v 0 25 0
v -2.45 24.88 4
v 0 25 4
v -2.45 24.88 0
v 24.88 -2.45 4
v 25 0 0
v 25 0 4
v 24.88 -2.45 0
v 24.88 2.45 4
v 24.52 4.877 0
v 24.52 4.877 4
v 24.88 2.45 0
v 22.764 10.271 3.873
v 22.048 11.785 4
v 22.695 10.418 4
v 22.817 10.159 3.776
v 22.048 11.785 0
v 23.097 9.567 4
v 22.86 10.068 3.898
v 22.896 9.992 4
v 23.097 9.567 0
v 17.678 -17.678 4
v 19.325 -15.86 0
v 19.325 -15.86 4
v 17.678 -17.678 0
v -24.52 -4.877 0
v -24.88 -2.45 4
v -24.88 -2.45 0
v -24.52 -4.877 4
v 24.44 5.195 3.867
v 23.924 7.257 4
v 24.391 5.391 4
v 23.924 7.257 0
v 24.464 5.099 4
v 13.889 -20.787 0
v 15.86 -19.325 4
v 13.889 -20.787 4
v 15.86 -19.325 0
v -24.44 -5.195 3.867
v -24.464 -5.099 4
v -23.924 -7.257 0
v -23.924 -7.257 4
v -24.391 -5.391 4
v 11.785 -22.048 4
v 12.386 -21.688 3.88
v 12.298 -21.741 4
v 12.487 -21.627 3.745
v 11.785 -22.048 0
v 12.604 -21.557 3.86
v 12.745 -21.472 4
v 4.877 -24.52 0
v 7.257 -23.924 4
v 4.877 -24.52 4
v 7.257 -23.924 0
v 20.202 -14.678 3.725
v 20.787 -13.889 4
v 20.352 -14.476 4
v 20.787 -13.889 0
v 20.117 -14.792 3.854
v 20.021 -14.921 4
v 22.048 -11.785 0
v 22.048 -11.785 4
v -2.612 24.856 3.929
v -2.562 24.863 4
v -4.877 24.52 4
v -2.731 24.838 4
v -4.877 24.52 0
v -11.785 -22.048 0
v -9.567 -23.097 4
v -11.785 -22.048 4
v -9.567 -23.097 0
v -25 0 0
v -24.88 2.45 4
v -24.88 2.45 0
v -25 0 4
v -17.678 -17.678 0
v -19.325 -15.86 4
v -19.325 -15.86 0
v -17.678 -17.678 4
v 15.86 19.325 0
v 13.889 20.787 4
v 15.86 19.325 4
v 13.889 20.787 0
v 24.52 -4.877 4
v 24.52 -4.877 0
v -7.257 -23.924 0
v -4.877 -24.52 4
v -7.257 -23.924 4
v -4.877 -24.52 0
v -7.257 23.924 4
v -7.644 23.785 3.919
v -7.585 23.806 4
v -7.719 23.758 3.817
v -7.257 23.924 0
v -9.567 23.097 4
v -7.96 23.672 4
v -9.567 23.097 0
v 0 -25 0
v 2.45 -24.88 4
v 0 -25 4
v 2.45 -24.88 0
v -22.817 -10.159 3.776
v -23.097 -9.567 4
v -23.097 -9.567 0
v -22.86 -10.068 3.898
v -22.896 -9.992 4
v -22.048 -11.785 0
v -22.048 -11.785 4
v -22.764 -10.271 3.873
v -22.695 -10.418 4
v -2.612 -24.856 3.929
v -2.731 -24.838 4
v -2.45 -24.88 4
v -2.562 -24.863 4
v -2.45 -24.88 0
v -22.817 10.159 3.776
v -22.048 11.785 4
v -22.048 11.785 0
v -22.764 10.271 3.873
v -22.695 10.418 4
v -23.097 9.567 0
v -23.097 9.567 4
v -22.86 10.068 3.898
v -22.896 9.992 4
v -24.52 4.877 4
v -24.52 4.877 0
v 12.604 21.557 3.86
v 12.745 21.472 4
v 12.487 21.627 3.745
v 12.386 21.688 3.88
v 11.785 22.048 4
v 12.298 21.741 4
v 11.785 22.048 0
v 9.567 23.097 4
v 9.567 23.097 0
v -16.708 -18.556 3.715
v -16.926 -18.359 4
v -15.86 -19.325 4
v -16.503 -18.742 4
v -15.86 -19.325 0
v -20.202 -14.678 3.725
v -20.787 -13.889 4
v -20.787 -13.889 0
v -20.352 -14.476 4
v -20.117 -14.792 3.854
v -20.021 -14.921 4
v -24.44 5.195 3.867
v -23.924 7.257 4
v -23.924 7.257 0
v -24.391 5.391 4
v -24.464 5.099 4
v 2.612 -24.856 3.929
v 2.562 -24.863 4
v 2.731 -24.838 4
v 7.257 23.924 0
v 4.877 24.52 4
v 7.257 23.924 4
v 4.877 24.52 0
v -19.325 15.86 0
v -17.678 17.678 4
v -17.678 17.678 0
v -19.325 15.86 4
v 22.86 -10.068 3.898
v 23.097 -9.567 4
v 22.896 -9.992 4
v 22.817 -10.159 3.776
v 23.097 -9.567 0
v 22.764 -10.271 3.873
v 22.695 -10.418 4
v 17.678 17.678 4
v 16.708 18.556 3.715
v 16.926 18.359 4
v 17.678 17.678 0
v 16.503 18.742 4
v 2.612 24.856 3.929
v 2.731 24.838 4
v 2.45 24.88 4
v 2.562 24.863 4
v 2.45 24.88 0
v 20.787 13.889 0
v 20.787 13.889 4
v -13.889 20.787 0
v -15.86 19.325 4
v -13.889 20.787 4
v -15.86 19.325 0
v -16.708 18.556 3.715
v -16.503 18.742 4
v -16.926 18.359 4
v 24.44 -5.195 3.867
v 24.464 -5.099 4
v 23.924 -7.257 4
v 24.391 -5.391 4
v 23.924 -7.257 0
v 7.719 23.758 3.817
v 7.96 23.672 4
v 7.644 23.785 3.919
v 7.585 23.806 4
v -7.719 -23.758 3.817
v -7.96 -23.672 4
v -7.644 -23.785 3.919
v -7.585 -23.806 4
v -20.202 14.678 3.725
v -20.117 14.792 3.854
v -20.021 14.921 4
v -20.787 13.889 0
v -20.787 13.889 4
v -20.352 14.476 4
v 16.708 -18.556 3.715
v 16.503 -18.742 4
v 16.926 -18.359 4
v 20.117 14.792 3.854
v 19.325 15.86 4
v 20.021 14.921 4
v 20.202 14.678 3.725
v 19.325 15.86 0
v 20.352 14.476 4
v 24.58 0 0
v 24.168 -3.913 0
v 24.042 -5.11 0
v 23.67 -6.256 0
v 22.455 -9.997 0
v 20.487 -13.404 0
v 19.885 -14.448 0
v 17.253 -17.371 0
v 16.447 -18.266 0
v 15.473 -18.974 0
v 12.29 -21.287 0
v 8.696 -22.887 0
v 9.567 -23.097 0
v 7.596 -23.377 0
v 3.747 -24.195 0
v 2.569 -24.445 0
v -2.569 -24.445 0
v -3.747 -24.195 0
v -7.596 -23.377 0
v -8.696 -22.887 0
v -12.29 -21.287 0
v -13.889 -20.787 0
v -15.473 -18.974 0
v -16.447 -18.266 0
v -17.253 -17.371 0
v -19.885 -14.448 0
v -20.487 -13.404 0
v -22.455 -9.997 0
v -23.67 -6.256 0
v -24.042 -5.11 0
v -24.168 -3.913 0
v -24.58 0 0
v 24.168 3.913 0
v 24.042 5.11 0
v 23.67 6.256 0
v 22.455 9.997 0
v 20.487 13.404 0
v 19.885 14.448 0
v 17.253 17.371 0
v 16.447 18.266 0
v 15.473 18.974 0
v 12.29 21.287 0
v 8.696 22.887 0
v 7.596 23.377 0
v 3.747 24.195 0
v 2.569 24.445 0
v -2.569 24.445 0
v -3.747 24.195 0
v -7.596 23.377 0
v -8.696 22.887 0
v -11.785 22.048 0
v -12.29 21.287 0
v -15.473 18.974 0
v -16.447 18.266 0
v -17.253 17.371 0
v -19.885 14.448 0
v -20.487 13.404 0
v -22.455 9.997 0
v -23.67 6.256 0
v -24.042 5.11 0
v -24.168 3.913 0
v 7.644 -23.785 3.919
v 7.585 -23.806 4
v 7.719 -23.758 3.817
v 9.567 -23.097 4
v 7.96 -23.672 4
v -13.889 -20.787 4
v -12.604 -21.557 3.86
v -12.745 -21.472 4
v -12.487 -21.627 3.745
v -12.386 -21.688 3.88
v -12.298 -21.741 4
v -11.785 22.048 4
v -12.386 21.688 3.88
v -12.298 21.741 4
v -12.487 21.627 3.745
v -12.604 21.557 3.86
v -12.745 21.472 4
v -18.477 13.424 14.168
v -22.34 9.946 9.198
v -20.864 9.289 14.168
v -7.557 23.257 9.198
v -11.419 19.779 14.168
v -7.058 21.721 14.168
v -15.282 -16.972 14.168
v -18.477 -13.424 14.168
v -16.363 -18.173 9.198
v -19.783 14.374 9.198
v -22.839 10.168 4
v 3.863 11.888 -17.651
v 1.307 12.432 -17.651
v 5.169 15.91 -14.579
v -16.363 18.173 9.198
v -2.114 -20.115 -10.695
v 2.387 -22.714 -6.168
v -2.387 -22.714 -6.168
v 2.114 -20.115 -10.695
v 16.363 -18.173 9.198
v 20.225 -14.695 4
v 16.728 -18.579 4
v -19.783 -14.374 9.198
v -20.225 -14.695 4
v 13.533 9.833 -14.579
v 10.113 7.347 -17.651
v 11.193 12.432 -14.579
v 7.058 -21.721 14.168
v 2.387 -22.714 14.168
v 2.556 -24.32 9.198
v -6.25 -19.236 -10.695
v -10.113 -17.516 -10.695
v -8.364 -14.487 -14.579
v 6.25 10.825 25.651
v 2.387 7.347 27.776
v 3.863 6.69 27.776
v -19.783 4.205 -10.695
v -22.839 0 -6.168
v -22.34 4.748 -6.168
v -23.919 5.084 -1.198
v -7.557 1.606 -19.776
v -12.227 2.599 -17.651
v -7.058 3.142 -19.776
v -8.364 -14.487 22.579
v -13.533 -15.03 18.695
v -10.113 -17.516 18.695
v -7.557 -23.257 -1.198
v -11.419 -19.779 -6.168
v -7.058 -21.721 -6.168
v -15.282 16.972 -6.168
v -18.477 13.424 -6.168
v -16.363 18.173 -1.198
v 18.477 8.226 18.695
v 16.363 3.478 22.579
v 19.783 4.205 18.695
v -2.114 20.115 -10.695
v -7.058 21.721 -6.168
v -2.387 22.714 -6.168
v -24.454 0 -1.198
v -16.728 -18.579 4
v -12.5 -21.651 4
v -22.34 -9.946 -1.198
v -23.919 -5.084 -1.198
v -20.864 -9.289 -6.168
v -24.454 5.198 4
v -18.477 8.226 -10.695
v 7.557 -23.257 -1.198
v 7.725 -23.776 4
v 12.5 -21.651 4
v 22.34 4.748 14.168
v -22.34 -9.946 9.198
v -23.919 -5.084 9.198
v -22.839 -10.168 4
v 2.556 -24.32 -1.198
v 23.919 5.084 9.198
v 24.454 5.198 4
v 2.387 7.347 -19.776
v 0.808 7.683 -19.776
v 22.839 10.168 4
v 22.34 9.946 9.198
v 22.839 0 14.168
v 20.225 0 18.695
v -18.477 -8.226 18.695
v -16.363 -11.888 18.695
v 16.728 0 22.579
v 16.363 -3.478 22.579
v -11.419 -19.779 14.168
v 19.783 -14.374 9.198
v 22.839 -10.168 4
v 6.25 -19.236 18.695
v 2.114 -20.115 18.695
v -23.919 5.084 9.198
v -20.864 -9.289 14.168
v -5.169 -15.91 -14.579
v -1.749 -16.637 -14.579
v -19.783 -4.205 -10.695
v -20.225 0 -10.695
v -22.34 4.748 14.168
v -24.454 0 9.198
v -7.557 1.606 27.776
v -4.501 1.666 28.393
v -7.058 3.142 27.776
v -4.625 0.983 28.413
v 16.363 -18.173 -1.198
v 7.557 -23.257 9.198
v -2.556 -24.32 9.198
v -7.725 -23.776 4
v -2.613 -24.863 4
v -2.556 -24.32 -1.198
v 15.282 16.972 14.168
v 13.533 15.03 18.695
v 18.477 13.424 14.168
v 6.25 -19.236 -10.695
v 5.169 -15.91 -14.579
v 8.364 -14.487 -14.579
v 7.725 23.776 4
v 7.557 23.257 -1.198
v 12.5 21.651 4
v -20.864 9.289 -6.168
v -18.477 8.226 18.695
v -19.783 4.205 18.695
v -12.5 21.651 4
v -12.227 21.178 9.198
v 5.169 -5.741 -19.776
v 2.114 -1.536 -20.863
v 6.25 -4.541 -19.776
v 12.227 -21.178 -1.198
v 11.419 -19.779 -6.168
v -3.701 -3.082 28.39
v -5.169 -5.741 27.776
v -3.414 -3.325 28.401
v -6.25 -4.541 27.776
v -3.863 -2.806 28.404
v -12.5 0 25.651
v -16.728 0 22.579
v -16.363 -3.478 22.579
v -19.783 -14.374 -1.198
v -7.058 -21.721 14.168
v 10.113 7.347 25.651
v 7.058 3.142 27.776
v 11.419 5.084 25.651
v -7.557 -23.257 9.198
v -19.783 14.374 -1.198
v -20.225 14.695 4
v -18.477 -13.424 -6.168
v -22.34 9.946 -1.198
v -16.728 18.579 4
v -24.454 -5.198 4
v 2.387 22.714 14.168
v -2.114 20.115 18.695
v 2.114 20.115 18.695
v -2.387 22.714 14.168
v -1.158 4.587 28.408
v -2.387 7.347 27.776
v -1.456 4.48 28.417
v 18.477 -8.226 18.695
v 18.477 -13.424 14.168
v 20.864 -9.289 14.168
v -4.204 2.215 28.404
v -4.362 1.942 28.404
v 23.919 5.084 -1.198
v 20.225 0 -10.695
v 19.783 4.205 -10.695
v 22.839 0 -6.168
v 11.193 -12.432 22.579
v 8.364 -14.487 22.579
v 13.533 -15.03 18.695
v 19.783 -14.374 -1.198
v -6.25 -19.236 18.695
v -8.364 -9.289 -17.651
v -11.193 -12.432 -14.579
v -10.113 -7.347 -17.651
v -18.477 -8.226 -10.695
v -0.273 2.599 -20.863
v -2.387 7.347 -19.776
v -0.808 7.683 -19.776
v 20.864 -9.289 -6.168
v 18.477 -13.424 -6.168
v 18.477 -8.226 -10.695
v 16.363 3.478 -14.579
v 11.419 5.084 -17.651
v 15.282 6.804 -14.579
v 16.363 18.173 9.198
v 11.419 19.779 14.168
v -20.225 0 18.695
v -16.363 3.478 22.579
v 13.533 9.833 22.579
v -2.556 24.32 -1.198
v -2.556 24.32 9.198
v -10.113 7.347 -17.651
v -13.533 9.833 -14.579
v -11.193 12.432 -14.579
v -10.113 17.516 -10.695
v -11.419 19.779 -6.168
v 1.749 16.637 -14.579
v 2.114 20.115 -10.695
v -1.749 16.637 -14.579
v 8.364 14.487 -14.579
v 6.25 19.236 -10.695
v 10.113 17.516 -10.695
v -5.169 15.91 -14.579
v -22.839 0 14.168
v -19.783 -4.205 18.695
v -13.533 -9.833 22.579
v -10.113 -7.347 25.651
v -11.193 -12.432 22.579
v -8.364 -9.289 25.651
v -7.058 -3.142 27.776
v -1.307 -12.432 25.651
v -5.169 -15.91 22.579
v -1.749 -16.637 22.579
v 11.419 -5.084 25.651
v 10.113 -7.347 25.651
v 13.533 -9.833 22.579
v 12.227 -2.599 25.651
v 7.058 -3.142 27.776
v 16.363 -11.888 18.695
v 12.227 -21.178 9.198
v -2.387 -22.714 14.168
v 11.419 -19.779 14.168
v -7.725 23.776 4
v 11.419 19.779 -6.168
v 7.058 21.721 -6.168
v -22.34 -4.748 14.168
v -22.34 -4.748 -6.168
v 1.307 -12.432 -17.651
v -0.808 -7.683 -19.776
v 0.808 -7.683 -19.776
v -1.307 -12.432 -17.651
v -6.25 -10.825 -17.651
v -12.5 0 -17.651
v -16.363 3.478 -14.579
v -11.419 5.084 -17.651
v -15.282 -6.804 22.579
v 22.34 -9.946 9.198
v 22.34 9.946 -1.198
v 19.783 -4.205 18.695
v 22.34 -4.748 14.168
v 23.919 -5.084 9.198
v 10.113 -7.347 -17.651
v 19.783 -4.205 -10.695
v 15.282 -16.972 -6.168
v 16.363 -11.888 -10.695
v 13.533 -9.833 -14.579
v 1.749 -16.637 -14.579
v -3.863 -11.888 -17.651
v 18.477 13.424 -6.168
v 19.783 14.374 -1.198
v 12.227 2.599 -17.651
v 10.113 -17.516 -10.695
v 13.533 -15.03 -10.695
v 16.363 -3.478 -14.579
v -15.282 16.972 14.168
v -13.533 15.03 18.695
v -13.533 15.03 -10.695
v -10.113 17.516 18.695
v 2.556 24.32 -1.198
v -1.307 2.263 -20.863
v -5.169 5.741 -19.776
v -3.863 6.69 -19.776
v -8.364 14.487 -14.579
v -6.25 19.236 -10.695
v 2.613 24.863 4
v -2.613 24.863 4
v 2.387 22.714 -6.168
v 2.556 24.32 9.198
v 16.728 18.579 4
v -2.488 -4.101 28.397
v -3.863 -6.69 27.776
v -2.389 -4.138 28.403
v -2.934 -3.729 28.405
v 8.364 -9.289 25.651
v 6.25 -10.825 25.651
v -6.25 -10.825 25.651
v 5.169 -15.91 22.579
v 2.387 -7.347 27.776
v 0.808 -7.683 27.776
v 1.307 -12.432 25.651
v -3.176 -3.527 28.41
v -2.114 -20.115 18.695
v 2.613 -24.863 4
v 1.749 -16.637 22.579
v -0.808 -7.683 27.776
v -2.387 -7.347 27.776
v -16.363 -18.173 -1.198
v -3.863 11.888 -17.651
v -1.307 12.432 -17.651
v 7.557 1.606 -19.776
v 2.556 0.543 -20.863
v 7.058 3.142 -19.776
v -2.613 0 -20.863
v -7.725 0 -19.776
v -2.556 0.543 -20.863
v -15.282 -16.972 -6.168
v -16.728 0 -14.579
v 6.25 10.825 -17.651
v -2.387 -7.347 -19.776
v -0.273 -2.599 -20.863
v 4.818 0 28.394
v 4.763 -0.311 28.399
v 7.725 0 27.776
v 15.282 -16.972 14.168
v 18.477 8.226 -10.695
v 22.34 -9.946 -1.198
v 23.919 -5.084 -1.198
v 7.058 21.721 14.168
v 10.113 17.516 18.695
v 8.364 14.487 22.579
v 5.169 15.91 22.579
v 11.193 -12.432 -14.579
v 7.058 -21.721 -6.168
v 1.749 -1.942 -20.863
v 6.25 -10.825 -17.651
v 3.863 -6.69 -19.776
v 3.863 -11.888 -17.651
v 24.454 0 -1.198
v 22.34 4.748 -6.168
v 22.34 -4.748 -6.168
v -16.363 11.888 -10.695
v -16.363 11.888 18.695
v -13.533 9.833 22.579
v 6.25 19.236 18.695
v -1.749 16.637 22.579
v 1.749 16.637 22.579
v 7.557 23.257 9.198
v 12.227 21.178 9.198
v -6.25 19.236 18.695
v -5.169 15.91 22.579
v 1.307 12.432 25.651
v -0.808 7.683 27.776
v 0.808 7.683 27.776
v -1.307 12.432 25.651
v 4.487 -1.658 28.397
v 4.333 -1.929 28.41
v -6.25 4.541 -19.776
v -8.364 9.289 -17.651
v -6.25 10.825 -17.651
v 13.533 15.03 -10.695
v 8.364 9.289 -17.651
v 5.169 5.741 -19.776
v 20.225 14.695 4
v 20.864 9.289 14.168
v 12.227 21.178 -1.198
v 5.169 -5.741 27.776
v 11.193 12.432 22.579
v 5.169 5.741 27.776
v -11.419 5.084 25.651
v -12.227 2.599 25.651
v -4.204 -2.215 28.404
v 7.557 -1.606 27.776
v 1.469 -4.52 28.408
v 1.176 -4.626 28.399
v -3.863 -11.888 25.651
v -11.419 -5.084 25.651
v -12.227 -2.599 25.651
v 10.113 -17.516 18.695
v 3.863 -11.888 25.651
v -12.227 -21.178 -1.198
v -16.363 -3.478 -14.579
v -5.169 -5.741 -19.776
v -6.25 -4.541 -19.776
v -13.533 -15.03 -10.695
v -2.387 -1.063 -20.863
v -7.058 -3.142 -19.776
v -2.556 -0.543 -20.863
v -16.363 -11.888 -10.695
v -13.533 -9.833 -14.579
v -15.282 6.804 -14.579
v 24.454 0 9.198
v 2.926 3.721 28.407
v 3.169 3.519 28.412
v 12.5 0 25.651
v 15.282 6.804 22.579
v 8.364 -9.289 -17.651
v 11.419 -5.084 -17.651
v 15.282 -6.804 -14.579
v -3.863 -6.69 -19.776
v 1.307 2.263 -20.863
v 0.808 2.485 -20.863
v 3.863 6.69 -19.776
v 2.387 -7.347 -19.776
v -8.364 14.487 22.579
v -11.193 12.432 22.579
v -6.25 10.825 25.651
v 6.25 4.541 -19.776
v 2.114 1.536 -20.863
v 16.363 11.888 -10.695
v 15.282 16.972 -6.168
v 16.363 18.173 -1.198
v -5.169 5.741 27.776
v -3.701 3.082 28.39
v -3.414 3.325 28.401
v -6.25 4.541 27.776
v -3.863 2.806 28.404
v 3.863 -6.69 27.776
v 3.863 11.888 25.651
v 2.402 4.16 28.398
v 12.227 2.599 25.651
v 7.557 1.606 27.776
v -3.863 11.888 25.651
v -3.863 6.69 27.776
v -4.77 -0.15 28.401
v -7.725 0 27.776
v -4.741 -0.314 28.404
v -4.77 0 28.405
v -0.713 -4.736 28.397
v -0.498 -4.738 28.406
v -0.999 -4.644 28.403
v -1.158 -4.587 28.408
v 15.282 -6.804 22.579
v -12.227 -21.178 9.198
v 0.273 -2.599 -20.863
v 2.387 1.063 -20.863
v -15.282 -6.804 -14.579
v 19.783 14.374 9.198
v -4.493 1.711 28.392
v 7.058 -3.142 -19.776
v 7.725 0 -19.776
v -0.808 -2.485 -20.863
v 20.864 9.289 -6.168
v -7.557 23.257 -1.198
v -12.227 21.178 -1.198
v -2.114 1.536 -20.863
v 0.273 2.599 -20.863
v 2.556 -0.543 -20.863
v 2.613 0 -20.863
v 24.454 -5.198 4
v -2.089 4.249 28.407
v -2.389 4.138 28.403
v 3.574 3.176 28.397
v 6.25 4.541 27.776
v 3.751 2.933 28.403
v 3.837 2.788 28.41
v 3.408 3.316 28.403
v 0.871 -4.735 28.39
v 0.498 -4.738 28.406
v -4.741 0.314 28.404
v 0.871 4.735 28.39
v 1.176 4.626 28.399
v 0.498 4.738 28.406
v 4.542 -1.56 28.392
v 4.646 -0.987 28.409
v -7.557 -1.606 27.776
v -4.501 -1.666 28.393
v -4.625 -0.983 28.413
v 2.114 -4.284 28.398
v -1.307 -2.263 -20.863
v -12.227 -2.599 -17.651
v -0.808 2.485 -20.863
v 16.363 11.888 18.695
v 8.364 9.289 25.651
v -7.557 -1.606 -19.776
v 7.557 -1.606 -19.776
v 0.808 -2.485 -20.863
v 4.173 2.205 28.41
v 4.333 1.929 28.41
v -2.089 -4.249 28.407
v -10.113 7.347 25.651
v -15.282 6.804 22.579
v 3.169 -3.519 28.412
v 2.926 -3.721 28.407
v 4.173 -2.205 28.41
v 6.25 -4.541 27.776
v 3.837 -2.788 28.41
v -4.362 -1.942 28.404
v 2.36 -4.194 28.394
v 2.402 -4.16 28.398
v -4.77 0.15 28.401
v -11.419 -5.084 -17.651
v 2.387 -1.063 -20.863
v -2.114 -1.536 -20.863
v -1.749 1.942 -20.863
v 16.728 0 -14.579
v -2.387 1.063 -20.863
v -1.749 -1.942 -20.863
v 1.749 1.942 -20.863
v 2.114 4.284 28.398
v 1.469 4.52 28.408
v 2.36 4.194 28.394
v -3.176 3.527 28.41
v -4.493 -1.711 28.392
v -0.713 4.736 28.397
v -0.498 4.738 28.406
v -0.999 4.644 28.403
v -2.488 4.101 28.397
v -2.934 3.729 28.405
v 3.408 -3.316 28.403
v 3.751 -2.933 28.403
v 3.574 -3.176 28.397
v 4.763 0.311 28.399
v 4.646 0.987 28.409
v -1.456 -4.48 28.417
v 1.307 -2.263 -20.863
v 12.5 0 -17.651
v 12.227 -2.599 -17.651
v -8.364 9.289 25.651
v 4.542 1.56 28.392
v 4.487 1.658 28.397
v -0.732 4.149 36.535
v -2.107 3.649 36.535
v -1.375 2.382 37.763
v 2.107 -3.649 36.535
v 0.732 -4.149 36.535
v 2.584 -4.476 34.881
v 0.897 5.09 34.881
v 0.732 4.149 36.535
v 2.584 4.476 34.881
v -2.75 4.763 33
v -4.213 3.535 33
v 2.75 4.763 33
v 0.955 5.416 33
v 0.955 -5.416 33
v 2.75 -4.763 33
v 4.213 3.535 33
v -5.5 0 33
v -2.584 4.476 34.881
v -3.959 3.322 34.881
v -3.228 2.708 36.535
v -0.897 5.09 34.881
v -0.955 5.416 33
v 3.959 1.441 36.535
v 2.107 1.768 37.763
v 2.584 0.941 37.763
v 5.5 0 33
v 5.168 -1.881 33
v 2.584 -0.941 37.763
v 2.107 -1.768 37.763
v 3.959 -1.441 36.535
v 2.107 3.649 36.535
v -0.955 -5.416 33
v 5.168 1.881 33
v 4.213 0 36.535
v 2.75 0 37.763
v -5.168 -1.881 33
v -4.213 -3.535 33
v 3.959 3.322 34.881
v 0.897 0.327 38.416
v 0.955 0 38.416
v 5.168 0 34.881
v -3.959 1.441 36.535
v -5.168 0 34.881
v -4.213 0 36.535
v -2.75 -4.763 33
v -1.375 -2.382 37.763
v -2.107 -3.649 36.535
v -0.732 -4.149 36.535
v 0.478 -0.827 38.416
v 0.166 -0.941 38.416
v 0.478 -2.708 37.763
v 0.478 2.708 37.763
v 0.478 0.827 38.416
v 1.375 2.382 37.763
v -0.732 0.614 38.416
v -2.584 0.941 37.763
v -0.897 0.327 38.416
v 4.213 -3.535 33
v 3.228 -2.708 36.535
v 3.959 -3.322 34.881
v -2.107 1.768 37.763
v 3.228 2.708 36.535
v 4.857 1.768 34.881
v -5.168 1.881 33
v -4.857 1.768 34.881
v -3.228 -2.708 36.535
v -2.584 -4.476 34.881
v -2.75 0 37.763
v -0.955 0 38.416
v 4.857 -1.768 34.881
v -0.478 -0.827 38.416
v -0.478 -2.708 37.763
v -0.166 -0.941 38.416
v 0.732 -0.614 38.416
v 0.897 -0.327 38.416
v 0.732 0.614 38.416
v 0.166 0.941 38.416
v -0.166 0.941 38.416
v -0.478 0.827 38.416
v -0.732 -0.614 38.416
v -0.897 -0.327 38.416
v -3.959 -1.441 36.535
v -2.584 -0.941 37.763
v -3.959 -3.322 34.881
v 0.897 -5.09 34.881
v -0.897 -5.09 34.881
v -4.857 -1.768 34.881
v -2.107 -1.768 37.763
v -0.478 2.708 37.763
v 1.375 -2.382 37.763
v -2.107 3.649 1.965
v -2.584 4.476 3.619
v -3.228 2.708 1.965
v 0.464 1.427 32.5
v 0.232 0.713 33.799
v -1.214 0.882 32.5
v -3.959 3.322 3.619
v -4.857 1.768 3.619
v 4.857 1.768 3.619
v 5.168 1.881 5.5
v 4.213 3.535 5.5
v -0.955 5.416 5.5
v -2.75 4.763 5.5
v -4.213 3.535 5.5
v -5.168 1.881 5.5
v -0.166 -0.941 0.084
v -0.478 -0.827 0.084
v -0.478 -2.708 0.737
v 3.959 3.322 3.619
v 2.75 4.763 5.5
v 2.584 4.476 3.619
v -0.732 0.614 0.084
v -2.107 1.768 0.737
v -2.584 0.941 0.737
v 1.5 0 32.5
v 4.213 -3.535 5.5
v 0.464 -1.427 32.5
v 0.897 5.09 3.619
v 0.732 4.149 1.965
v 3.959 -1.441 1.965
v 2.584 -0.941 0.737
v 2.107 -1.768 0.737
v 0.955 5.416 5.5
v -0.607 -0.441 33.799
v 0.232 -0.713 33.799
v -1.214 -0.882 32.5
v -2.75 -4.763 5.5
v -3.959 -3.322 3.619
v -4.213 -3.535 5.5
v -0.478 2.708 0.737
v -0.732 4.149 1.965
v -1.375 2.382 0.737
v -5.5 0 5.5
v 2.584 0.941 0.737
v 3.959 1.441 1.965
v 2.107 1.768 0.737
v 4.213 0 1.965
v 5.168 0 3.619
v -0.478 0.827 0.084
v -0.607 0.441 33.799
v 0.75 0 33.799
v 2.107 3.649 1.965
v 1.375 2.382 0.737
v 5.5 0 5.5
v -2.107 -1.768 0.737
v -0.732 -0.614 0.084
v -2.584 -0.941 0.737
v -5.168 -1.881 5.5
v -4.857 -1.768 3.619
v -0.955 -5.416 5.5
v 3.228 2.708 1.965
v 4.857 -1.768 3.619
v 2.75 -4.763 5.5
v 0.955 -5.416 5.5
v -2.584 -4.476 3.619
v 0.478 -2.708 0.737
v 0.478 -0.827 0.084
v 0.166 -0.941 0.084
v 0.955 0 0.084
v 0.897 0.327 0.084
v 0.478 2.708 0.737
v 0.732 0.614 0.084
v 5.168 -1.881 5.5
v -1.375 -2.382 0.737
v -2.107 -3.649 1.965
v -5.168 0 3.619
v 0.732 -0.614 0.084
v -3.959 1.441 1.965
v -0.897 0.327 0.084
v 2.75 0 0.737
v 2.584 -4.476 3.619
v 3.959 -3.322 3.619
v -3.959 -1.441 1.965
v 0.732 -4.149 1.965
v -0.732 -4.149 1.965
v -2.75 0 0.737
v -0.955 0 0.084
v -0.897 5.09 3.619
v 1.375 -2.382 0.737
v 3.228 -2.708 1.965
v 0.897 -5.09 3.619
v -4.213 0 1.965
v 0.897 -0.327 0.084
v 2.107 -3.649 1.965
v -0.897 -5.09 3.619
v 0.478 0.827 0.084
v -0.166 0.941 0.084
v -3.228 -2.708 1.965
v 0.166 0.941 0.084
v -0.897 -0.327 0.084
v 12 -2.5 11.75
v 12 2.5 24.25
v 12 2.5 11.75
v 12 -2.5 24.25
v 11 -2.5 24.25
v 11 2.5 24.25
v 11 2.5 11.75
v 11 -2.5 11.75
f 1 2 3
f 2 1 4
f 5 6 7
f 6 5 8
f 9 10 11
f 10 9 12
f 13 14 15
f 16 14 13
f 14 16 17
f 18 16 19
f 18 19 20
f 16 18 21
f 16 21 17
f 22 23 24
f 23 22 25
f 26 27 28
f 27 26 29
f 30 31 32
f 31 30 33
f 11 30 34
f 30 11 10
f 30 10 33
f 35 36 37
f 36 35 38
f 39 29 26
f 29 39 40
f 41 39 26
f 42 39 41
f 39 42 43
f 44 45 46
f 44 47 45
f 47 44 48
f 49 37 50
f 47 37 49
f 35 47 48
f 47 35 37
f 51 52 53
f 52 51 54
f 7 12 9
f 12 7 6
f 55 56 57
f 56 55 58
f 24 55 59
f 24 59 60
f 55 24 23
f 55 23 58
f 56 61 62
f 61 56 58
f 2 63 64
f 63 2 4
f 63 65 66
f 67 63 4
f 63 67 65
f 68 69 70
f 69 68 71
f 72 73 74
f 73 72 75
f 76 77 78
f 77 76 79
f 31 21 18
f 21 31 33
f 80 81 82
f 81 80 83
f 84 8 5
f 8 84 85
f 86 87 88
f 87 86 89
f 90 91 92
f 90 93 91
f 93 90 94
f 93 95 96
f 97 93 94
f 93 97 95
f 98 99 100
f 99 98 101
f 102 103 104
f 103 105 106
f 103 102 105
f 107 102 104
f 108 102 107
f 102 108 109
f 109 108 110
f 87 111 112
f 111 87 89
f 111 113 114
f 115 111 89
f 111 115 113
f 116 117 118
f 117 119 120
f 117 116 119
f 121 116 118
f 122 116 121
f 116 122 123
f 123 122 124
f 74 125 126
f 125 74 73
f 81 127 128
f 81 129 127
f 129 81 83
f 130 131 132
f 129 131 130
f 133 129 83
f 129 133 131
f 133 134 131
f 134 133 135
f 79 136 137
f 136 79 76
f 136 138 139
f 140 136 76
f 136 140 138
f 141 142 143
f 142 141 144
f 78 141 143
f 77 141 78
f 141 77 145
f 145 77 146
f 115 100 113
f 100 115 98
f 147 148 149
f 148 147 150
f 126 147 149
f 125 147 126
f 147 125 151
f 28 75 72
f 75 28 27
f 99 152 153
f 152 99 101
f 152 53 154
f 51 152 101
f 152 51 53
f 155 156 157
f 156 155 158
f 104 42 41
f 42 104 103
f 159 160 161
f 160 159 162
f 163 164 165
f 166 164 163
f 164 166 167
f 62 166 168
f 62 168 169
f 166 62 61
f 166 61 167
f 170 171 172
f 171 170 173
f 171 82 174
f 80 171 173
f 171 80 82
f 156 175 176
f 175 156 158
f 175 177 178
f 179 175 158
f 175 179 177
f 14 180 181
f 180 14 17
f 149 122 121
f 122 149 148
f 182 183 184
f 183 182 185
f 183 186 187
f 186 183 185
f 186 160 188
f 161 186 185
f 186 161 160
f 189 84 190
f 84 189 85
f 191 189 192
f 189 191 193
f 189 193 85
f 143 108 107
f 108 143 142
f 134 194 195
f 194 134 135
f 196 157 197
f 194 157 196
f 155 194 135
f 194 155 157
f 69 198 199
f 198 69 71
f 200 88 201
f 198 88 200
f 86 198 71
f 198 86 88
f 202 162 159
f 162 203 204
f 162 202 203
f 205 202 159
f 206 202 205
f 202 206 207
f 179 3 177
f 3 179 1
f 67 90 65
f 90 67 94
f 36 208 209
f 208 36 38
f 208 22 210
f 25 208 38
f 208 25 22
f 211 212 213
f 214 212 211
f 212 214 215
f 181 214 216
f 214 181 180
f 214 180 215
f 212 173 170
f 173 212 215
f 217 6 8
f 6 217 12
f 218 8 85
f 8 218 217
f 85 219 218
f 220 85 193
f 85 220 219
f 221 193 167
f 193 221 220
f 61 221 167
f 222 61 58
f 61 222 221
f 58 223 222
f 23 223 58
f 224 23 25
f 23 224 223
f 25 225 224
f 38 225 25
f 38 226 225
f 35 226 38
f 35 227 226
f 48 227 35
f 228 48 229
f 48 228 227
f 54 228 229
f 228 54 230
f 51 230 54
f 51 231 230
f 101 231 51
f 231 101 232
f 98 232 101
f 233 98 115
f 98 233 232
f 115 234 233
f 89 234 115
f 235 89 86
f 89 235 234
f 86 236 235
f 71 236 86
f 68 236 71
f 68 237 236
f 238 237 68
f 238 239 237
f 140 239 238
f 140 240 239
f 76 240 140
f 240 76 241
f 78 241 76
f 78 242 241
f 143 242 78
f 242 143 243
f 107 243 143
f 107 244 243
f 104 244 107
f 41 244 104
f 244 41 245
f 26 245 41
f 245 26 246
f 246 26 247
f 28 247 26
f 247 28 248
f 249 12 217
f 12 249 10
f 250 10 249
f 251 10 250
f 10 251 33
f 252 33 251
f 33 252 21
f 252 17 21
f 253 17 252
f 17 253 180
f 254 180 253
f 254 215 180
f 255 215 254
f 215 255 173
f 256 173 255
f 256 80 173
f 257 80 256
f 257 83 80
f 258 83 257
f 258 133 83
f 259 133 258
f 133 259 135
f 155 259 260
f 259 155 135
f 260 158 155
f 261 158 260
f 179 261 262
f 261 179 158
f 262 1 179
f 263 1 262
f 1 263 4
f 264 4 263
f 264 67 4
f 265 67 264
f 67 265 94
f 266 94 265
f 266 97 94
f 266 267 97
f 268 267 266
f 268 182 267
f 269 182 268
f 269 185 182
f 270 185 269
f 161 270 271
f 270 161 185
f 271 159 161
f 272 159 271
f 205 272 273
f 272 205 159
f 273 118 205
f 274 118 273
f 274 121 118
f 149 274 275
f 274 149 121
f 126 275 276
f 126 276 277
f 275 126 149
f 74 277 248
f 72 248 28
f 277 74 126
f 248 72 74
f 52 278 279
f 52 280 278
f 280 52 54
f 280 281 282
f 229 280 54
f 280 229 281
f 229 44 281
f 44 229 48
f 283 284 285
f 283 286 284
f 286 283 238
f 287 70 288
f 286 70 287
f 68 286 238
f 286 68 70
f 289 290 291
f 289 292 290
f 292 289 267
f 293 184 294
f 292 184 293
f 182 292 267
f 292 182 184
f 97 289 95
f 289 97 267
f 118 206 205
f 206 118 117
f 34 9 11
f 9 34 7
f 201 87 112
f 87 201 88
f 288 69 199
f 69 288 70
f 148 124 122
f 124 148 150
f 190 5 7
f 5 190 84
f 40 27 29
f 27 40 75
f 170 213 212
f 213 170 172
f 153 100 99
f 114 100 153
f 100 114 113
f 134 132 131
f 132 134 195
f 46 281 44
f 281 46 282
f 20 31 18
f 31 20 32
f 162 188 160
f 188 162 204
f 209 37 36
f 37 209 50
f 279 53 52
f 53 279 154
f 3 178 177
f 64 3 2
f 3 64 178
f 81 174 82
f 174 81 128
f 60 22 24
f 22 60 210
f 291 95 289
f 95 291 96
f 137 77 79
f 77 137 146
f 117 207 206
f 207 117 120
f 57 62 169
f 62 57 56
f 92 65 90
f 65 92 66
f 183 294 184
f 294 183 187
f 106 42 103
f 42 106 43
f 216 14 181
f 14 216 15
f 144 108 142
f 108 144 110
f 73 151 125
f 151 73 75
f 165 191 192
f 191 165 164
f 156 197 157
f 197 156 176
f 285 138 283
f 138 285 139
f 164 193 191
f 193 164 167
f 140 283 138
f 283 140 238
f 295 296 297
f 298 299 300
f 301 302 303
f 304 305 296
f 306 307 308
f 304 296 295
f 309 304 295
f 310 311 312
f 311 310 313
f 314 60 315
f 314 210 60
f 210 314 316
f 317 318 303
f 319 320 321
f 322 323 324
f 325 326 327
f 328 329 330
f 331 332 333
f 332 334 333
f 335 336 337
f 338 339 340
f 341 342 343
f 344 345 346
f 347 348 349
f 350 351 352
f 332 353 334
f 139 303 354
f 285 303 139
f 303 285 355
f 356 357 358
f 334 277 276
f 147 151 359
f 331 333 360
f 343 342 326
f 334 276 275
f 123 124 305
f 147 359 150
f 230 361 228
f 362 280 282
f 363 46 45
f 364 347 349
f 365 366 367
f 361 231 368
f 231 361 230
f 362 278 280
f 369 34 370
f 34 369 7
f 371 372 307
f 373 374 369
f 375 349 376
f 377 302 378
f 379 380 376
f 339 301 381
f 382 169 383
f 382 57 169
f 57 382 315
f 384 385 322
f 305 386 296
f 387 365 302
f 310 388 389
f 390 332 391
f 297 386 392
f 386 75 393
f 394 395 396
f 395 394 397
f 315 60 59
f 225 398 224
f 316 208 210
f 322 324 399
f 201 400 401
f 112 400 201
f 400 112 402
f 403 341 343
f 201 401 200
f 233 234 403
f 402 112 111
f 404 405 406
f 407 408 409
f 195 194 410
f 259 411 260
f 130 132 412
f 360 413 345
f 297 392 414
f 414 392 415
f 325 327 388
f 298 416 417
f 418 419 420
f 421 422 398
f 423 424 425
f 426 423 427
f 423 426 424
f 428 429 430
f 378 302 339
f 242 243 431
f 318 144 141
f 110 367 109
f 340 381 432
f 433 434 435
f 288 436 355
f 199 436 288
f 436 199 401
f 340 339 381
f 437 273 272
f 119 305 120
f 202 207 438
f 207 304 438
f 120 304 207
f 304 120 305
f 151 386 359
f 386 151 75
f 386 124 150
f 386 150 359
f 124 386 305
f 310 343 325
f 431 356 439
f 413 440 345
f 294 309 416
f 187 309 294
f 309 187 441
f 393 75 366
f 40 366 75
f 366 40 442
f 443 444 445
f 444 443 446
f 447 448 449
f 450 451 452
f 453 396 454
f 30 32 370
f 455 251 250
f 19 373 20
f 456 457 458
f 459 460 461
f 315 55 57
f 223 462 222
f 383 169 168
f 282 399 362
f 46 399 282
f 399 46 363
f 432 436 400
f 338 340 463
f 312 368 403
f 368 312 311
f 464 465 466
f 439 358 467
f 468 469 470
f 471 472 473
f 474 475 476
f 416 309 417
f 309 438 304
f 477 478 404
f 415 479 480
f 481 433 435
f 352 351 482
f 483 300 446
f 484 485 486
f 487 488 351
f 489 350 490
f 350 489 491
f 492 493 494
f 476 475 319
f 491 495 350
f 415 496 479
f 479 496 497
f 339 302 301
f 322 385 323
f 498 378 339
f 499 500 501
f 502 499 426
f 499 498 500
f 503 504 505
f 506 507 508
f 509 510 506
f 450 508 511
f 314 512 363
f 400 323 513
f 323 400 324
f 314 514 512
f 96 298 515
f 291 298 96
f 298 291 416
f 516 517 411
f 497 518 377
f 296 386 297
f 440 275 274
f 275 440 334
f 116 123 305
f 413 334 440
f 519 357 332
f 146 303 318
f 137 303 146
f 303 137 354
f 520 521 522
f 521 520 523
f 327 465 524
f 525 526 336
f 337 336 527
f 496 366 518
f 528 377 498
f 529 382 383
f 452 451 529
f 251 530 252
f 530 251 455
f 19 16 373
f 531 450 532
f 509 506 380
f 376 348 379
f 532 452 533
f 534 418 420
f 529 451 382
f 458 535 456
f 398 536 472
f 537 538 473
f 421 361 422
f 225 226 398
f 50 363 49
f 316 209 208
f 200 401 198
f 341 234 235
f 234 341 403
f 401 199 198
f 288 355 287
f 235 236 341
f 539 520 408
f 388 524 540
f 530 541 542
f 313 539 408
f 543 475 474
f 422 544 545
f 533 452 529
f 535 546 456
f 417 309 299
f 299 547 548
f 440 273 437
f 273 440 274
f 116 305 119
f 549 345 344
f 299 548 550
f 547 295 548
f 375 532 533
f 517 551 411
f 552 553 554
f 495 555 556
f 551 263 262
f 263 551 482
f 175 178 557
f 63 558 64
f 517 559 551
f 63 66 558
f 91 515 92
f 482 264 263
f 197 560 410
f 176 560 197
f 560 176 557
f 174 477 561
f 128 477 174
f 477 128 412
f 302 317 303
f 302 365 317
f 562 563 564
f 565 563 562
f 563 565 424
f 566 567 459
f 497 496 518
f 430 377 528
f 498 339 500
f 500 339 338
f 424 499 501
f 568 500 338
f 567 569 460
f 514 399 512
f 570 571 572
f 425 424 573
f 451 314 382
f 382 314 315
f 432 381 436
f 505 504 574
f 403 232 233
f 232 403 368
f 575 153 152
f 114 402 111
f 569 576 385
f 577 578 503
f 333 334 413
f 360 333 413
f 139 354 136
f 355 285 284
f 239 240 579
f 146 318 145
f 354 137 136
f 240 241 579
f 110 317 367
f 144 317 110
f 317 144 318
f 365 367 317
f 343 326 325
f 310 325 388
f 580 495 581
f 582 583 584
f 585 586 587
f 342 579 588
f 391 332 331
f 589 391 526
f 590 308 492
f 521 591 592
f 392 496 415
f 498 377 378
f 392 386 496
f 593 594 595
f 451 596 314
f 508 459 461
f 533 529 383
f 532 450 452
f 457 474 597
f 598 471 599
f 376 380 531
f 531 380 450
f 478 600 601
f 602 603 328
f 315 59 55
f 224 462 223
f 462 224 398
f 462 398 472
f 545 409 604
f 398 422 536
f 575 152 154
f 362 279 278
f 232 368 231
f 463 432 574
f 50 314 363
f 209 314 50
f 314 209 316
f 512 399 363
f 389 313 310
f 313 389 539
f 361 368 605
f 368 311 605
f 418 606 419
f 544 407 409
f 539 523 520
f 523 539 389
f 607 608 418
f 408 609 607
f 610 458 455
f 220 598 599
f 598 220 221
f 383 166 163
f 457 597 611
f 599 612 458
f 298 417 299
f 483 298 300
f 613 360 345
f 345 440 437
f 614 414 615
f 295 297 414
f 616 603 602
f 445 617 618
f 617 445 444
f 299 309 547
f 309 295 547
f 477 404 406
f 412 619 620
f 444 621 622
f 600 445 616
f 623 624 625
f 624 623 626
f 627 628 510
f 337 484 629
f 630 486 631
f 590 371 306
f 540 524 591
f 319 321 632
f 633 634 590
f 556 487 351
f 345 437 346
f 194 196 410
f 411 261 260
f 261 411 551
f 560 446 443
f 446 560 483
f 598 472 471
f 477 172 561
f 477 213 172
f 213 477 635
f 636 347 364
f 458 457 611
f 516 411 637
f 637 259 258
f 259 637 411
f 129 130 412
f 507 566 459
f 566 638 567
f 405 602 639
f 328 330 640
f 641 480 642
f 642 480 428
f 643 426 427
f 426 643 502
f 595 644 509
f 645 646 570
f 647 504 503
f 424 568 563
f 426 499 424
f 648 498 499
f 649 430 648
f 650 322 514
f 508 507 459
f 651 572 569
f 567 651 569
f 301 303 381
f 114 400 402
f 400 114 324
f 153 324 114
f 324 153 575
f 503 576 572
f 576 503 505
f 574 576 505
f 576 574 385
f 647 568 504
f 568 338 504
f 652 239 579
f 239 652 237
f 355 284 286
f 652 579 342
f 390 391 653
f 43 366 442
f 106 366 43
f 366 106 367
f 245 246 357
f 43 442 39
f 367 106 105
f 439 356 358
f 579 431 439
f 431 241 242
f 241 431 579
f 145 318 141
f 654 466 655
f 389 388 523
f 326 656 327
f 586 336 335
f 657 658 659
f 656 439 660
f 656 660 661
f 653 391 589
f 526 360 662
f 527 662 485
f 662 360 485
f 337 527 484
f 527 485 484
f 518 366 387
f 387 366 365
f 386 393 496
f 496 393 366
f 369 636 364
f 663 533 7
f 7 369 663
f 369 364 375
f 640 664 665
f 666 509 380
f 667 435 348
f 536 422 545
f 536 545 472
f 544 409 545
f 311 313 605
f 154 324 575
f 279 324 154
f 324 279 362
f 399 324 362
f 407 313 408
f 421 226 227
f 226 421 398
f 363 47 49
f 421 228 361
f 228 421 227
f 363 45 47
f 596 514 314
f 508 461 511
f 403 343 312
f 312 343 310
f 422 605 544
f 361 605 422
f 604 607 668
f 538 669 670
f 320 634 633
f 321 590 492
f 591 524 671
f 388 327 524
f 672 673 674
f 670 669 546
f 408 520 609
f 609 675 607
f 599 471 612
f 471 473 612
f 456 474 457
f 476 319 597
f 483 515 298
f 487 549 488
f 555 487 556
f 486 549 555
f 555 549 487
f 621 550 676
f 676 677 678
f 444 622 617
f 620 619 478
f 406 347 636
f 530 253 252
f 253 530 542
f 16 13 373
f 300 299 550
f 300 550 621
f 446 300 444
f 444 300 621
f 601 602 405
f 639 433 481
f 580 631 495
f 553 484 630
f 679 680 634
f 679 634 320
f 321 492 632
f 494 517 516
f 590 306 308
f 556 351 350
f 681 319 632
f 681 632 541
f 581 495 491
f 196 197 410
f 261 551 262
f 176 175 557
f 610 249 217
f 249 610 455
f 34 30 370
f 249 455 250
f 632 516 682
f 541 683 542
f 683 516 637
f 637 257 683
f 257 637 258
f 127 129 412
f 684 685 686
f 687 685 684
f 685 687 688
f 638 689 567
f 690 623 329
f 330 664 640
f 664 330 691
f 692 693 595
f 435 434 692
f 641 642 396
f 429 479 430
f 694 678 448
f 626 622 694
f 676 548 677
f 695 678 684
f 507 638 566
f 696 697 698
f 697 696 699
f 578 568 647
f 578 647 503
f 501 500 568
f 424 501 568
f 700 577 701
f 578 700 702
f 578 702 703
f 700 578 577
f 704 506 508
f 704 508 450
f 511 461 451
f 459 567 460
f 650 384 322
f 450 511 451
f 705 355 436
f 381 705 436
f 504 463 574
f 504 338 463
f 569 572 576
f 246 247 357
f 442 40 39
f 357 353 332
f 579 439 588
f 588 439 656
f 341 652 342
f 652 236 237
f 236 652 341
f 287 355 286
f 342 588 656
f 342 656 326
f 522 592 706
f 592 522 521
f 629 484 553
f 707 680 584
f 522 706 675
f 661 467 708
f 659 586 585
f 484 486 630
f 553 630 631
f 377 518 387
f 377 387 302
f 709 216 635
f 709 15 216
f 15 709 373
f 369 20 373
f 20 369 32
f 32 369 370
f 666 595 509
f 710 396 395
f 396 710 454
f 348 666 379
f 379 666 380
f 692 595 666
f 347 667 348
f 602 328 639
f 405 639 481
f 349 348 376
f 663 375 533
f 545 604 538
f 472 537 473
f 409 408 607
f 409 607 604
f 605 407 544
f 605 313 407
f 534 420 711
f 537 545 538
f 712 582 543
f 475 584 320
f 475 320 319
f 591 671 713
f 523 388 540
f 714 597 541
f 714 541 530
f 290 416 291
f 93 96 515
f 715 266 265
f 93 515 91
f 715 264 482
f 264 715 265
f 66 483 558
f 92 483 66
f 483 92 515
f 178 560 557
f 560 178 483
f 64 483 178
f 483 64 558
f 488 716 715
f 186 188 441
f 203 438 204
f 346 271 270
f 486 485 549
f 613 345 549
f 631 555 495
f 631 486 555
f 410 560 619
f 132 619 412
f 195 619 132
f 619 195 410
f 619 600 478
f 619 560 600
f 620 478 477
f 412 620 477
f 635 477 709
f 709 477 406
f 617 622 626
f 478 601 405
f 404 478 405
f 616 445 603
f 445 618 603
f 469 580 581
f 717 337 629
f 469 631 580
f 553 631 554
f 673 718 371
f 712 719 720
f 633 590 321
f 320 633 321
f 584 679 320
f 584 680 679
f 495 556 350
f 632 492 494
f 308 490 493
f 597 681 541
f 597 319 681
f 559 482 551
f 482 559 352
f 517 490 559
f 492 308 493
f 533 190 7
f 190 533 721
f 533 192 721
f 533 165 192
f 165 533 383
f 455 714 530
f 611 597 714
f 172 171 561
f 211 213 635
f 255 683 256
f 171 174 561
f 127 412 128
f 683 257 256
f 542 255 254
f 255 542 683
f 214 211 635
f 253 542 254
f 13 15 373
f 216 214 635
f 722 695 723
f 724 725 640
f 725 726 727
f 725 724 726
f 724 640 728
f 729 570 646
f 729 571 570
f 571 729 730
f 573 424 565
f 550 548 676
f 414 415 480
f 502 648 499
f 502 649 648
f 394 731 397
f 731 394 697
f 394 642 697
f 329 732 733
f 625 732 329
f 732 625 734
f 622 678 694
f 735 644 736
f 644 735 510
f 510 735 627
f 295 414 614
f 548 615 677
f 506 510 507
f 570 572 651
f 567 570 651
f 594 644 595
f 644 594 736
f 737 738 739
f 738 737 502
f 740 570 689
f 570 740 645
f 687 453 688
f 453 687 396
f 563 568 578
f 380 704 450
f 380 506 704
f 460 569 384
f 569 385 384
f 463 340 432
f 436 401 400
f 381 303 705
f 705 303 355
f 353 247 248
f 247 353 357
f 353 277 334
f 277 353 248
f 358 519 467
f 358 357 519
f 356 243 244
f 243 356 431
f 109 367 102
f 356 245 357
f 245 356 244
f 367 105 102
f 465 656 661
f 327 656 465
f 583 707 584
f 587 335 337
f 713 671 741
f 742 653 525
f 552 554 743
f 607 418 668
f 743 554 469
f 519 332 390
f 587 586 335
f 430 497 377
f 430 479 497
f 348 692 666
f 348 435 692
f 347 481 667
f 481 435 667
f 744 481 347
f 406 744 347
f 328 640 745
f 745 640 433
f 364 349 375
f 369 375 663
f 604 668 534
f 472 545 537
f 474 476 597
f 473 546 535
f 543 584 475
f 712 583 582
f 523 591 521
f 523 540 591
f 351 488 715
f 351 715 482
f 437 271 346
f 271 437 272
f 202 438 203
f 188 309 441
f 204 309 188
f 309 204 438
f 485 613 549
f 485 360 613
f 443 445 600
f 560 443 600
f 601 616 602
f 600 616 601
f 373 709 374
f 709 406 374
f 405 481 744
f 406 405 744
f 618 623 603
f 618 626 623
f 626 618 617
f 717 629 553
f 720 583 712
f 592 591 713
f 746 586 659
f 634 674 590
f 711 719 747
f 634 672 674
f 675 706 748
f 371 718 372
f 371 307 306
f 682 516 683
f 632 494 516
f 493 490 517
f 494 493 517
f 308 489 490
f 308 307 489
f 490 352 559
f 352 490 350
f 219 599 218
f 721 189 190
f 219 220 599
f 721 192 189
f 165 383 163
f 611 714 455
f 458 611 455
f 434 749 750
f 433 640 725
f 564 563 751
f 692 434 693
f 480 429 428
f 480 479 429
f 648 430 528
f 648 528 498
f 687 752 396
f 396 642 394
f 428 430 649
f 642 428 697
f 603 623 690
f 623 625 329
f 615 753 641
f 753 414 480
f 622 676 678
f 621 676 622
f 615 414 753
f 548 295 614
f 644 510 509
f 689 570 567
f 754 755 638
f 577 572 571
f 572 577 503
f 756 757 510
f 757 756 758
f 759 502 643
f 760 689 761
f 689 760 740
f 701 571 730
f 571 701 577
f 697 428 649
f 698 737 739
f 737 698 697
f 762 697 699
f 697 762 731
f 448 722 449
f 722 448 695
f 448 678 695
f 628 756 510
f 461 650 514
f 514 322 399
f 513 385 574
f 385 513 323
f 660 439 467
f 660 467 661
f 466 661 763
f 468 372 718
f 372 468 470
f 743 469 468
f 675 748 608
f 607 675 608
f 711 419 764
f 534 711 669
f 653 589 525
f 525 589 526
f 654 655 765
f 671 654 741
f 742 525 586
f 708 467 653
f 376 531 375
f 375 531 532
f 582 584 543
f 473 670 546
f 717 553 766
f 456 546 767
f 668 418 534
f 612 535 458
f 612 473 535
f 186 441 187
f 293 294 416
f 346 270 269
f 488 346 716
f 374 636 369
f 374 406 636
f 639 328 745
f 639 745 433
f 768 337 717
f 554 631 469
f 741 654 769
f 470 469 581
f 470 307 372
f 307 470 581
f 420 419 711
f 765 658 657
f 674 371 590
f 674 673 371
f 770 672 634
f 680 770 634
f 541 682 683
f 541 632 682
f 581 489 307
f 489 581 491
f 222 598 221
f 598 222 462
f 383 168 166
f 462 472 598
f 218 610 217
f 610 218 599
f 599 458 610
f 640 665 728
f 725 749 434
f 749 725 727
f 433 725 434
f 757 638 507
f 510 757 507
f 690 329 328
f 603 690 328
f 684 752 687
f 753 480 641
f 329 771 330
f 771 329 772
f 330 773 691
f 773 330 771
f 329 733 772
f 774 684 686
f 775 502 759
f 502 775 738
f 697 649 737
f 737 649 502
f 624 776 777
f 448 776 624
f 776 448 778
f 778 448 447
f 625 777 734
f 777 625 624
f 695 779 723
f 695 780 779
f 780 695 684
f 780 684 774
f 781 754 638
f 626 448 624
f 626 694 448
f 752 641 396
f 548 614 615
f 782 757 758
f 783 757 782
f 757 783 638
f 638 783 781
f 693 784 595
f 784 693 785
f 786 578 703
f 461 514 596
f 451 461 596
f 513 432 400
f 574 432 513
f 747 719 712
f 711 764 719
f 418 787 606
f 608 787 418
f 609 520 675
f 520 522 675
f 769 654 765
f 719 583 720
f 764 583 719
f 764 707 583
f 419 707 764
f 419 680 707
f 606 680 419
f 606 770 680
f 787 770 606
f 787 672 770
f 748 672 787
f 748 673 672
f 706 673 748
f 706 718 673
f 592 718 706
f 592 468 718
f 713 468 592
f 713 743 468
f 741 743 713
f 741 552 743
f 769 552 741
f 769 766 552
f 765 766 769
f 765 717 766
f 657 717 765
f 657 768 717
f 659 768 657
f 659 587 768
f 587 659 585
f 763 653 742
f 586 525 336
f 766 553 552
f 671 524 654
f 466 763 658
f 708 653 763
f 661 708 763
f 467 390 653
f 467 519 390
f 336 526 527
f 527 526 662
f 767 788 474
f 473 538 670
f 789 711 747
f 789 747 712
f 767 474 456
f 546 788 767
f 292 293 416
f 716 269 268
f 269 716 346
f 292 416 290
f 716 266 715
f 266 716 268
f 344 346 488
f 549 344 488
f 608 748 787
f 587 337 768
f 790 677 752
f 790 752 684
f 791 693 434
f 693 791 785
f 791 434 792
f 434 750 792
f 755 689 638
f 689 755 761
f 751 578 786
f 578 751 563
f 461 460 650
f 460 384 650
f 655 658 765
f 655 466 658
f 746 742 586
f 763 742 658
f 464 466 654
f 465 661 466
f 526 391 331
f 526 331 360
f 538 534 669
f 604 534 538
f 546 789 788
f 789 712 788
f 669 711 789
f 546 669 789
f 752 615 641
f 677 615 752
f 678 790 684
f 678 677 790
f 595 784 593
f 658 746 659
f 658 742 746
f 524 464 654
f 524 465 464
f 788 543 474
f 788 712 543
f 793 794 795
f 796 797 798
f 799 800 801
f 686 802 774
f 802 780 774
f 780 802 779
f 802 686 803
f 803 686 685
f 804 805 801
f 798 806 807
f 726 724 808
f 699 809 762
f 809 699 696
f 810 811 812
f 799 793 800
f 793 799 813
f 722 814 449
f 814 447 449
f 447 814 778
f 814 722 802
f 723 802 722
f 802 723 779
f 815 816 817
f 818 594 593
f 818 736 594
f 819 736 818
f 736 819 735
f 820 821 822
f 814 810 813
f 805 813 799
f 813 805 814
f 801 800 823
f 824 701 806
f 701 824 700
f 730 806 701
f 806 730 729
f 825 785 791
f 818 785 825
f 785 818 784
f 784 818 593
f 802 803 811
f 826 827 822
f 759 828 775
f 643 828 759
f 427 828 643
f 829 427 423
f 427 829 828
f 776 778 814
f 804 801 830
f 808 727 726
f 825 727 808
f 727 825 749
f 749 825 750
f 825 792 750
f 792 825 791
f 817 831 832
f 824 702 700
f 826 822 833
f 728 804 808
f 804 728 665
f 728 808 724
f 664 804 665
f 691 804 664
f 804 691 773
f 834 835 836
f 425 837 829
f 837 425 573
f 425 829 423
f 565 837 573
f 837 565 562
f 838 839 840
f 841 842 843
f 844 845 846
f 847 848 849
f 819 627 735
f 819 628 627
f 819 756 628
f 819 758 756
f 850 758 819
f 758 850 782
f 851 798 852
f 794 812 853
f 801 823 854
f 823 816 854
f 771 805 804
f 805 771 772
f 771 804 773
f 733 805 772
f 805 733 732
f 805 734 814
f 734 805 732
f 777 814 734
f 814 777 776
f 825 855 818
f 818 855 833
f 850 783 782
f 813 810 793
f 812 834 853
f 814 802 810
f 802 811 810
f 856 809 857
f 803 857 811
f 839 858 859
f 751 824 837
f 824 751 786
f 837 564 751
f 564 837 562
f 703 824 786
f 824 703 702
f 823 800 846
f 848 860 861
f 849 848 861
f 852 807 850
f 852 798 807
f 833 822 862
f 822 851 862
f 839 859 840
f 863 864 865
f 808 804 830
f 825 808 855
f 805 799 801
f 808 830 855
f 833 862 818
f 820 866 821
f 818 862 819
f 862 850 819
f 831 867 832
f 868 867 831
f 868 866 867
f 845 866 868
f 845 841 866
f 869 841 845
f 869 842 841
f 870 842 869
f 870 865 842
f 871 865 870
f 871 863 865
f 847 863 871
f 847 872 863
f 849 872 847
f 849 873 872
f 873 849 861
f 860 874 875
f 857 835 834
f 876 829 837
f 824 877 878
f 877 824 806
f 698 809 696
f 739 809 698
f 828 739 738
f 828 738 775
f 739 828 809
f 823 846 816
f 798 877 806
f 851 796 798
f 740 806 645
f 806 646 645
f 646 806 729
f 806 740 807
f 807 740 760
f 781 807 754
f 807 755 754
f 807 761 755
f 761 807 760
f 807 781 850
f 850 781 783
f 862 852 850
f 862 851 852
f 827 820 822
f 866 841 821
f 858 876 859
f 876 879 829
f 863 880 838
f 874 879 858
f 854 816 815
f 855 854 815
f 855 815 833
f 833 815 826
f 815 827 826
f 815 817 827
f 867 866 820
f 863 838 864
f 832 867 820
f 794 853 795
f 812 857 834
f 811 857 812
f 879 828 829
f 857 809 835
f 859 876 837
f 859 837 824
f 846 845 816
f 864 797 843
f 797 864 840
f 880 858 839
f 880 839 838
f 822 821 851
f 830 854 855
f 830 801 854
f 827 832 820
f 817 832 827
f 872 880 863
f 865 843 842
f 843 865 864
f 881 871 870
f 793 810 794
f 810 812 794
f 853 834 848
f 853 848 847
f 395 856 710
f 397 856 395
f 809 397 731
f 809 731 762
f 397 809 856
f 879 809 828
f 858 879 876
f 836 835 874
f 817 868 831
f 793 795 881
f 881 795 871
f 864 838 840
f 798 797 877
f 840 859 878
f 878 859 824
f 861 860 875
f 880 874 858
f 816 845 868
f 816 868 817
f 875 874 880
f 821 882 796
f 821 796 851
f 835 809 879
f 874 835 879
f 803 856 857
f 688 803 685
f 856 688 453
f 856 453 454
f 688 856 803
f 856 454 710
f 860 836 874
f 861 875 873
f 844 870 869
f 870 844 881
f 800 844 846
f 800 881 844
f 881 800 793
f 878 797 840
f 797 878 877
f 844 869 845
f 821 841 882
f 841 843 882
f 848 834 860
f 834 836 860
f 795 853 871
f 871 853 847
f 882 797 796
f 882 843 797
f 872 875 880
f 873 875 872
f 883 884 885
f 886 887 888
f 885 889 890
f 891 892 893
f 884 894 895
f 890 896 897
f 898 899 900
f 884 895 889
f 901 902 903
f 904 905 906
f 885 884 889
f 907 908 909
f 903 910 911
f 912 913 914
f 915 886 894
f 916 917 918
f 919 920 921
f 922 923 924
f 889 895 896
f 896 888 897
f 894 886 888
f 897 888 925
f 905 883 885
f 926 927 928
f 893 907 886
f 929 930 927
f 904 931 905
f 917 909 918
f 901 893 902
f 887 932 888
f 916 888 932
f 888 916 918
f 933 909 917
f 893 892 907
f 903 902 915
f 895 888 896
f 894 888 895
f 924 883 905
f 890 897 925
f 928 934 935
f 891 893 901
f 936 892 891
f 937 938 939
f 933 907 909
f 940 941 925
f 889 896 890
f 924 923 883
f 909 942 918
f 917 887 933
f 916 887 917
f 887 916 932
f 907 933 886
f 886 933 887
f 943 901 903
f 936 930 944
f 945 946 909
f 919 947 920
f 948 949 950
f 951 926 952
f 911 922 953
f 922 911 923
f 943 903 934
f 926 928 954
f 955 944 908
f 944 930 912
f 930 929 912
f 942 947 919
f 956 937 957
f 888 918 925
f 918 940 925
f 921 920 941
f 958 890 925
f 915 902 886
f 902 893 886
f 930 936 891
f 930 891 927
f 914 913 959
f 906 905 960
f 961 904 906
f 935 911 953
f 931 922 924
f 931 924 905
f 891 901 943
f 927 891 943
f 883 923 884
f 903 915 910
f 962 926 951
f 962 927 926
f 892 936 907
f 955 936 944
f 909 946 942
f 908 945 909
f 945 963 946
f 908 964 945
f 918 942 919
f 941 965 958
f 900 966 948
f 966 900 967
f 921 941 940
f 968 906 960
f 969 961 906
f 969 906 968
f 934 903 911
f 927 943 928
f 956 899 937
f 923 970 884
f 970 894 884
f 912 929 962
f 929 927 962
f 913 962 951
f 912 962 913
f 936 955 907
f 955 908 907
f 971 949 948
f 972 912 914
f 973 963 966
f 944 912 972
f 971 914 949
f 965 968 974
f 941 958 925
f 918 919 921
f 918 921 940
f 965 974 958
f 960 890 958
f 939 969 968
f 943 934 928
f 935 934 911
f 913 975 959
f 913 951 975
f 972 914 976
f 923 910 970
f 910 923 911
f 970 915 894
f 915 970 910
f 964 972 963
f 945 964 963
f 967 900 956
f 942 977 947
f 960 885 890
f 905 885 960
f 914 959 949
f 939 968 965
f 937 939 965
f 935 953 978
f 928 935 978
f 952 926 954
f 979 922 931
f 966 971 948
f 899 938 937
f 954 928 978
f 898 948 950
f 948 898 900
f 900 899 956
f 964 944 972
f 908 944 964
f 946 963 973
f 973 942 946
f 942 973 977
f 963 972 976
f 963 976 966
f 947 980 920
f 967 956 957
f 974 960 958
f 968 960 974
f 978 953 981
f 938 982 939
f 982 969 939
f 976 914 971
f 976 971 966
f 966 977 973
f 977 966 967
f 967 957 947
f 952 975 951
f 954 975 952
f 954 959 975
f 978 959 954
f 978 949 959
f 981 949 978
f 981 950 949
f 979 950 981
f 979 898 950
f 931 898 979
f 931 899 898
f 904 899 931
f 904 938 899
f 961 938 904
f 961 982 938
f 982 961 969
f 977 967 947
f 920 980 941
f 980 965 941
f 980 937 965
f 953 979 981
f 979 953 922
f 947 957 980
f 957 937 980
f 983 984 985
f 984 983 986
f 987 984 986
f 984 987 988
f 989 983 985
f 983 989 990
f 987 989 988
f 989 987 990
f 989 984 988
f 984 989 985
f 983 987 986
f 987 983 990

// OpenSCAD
// --- Dimensions in mm ---

// Base dimensions
base_diameter = 50;      // Diameter of the base disc
base_height = 4;          // Height of the base disc

// Cone dimensions (Base to Column)
cone_start_z = 4;         // Z where cone starts
cone_end_z = 14;          // Z where cone ends
cone_start_diameter = 50; // Diameter at z=4
cone_end_diameter = 22;   // Diameter at z=14

// Column dimensions (Cylinder section)
column_height = 33 - 14;  // Height of the main column (from z=14 to z=33)
column_diameter = 22;     // Diameter of the column

// Tube Seat dimensions
seat_start_z = 33;        // Z where tube seat starts
seat_end_z = 6;           // Z where tube seat ends (Bottom tip is at z=6)
seat_diameter_top = 11;   // Diameter at z=33
seat_diameter_bottom = 3; // Diameter at z=6

// Viewing Window dimensions
window_width = 4;         // Width of the viewing window in Y direction
window_start_z = 18;      // Start Z for window cut
window_end_z = 30;        // End Z for window cut

// Tolerance for cutting operations (to avoid coplanar faces)
tolerance = 0.5;


// --- Main Assembly ---

difference() {
    // 1. Base Disc and Structure (Solid part)
    union() {
        // Base disc (Z=0 to Z=4)
        cylinder(h = base_height, r = base_diameter / 2, $fn = 64);

        // Cone section (Z=4 to Z=14) - Approximated using hull of two spheres/disks for smooth transition
        hull() {
            translate([0, 0, cone_start_z]) sphere(r = cone_start_diameter / 2);
            translate([0, 0, cone_end_z]) sphere(r = cone_end_diameter / 2);
        }

        // Column section (Z=14 to Z=33) - Cylinder
        cylinder(h = column_height, r = column_diameter / 2, $fn = 64);

        // Tube Seat Section (Tapered shape from z=33 down to z=6). We use hull between the top and bottom points.
        hull() {
            translate([0, 0, seat_start_z]) sphere(r = seat_diameter_top / 2);
            // The lowest point of the seat is at Z=6.
            translate([0, 0, seat_end_z]) sphere(r = seat_diameter_bottom / 2);
        }

    } // End of solid union

    // --- Subtractions (Holes and Windows) ---

    // 2. Tube Seat Cavity Cutout: We subtract the volume defined by the seat profile, ensuring it cuts through the structure below Z=6 if necessary.
    // The cavity must extend from Z=33 down to Z=6.
    translate([0, 0, seat_end_z - tolerance]) { // Start cutting slightly below the lowest point of the seat (Z=6)
        hull() {
            translate([0, 0, 0]) sphere(r = seat_diameter_top / 2);
            // The height difference between the two spheres in this hull operation is (seat_start_z - seat_end_z).
            // We must translate the second sphere correctly relative to the start of the hull operation.
            translate([0, 0, seat_start_z - seat_end_z]) sphere(r = seat_diameter_bottom / 2);
        }
    }


    // 3. Viewing Window Cutout (Through the main column wall)
    // The window is cut through the column wall between Z=18 and Z=30, on the +X side.
    translate([column_diameter/2 + tolerance, 0, window_start_z]) { // Position cut on the +X side wall (center of cylinder radius)
        // The cube must be wide enough in Y to cover the specified width (4mm) and tall enough for the Z range.
        cube([tolerance * 2, window_width + tolerance*2, window_end_z - window_start_z + tolerance], center = true);
    }

}
